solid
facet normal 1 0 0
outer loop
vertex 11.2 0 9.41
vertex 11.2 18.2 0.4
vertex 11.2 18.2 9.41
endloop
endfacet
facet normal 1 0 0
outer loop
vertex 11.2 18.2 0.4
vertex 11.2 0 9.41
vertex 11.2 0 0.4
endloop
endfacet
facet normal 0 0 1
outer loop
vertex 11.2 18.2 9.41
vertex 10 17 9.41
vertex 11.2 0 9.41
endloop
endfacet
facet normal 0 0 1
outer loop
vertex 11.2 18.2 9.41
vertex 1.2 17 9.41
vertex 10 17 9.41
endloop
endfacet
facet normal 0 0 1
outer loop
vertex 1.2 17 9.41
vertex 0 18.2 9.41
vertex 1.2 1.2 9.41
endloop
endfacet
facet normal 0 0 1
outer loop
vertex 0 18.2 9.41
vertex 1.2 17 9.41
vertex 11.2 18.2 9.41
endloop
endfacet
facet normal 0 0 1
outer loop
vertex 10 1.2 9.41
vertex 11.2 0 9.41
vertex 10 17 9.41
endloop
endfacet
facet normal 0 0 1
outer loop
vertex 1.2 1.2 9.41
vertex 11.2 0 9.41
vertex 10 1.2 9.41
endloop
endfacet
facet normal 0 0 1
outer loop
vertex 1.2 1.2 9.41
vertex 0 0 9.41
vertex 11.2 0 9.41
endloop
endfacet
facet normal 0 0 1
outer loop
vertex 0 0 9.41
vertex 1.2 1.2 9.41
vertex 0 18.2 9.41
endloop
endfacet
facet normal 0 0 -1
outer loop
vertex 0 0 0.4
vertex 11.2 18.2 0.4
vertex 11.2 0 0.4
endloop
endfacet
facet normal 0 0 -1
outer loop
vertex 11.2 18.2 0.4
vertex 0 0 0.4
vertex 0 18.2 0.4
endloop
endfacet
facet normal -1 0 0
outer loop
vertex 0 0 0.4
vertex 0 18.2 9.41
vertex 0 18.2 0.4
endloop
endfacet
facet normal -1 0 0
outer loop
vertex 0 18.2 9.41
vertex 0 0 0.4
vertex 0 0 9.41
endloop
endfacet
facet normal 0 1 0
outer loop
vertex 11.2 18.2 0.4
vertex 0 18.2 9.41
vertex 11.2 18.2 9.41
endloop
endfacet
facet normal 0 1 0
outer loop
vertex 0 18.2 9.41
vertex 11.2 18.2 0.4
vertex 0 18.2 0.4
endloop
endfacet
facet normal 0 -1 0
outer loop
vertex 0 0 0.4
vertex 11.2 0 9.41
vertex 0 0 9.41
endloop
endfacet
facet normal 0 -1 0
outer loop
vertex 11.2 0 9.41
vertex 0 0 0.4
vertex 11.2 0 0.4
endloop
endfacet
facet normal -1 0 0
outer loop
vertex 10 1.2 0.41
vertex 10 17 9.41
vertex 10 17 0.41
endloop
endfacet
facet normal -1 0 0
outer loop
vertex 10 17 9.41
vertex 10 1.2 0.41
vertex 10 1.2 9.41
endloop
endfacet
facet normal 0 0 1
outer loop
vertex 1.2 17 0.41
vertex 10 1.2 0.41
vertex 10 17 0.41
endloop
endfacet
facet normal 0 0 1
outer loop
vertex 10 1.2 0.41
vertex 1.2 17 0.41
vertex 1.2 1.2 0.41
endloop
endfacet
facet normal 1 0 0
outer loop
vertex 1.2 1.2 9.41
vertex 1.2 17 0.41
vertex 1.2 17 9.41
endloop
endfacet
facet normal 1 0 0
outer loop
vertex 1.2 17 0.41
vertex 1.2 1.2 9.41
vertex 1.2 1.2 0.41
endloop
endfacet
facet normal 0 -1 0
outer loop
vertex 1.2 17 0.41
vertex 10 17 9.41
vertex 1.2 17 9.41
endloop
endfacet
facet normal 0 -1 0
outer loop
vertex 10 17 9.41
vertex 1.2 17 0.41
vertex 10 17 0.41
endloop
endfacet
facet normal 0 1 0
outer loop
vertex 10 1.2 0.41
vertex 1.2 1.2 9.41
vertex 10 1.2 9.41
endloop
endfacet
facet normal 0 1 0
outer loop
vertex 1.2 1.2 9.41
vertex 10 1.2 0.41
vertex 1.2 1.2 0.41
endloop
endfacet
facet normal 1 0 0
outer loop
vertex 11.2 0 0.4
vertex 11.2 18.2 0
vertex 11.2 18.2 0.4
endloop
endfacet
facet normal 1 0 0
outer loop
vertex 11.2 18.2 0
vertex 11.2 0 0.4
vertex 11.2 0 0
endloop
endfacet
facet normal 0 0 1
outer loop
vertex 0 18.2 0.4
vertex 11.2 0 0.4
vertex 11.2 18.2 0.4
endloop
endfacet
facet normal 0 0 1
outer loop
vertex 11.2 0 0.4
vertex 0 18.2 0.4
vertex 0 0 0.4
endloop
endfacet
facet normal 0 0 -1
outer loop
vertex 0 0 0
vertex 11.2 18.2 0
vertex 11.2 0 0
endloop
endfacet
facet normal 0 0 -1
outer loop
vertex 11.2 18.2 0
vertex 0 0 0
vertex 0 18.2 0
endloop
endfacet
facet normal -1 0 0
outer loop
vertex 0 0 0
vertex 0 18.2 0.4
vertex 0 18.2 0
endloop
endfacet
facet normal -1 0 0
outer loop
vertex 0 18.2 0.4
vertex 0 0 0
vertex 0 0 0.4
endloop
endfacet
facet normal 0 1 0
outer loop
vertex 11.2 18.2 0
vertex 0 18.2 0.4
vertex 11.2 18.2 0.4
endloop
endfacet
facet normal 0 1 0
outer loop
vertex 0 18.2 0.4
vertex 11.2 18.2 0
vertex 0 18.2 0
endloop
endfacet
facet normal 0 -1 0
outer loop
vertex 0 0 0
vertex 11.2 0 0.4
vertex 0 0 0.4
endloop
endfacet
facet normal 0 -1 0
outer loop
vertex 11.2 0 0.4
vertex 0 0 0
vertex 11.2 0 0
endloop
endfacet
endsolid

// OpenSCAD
// file: ../../Base/Rotation.scad
// Fischertechnik Box Foundation
// Geometry Helpers Rotation

include <PlacementOptions.scad>

// getRotatedSpace(space, rotation=NoRotation)
// Rotates the space dependent on the specified rotation

function getRotatedSpace(space, rotation=NoRotation) = [
    (rotation == Rotate90 || rotation == Rotate270) ? space.y : space.x,
    (rotation == Rotate90 || rotation == Rotate270) ? space.x : space.y
];

// Rotates the given space around the fixed left lower corner
// space = the space the children needs as width/depth list [width,depth]
// rotation = 0 Rotate0 degrees, 1 Rotate90 degrees, 2 Rotate180 degrees, 3 Rotate270 degrees (equivalent to -90)

module RotateFix(space, rotation=NoRotation) {
    dy = (rotation == Rotate0 || rotation == Rotate270) ? 0 :
        (rotation == Rotate90) ? space.x :
        space.y;
    dx = (rotation < Rotate180) ? 0 :
        (rotation == Rotate180) ? space.x :
        space.y;
    
    translate([dx, dy, 0])
        rotate([0, 0, rotations[rotation]])
            children();
}
// file: ../../Base/Alignment.scad
// Fischertechnik Box Foundation
// Geometry Helpers Alignment

include <PlacementOptions.scad>

// getAlignedX(elementWidth, spaceWidth, align=AlignRight, offset=0)
// Gets the aligned X offset of an element with the given
// width in the given space.
// elementWidth = The width of the element to positon
// spaceWidth = The space where the element should be aligned
// align = 0 AlignLeft, 1 AlignCenter, 2 AlignRight
// offset = an optional offset from the aligned position. When
// aligned left or centered, then positive values are in X direction.
// When aligned right then positive values are in negative X direction.

function getAlignedX(elementWidth, spaceWidth, align=AlignRight, offset=0) =
    (align == AlignLeft) ?
        offset :
        ((align == AlignCenter) ?
        (spaceWidth - elementWidth)/2 + offset :
        spaceWidth - offset - elementWidth);

// getAlignedY(elementDepth, spaceDepth, align=AlignTop, offset=0)
// Gets the aligned Y offset of an element with the given
// depth in the given space.
// elementDepth = The depth of the element to positon
// spaceDepth = The space where the element should be aligned
// align = 0 AlignBottom, 1 AlignCenter, 2 AlignTop
// offset = an optional offset from the aligned position. When
// aligned bottom or centered, then positive values are in Y direction.
// When aligned top then positive values are in negative Y direction.

function getAlignedY(elementDepth, spaceDepth, align=AlignTop, offset=0) =
    (align == AlignBottom) ?
        offset :
        ((align == AlignCenter) ?
        (spaceDepth - elementDepth)/2 + offset :
        spaceDepth - offset - elementDepth);
// file: ../../Base/PlacementOptions.scad
// Fischertechnik Box Foundation
// Placement Options

// Alignment
NoAlign = 0;
AlignLeft = 1;
AlignBottom = 2;
AlignCenter = 3;
AlignRight = 4;
AlignTop = 5;

// Element rotation degree steps
rotations = [0, -90, -180, -270];

// Rotation
NoRotation = 0;
Rotate0 = 0;
Rotate90 = 1;
Rotate180 = 2;
Rotate270 = 3;

// Docking (seen from above)
NoDock = -1;
DockLeft = 0;
DockTop = 1;
DockRight = 2;
DockCorner = 2;
DockBottom = 3;

// Web corners
LowerLeft = 0;
UpperLeft = 1;
UpperRight = 2;
LowerRight = 3;

// Web position relative to corner
LeftOfCorner = 0;
RightOfCorner = 1;

// Rails direction
Horizontal = true;
Vertical = false;
// file: ../../Base/Boxes.scad
// Fischertechnik Box Foundation
// Pre-designed Boxes

use <Constants.scad>

include <PlacementOptions.scad>

box190Width = 190;
box190Depth = 130;
box130Width = 130;
box130Depth = 95;

// Values are from an original ec3 box
topBottomDifference = 1.5;
outerHeight = 40;
baseThickness = 1.8;
innerHeight = outerHeight - baseThickness;
stackExcess = 5.7;
radius = 3.5;
wallThickness = 1.5;
tolerance = 0.2;

boxWallThickness = wallThickness;
boxBaseThickness = baseThickness;
boxWebWidth = 3.0;

// getBoxWallThickness()
// Gets the wall thickness of a Fischertechnik Box
function getBoxWallThickness() = boxWallThickness;

// getBoxUsageHeight(height = 38.2)
// Gets the usable height of a Fischertechnik box
// height = Outer height of the box from the bottom to the upper edge.
function getBoxUsageHeight(height = outerHeight) = height - baseThickness - stackExcess;

// getBoxInnerHeight()
// Gets the inner height of a Fischertechnik box, including the stack excess
function getBoxInnerHeight() = innerHeight;

// getBoxBaseThickness()
// Gets the thickness of the Fischertechnik box base.
function getBoxBaseThickness() = boxBaseThickness;

// getBoxWebWidth()
// Gets the width of a box web
function getBoxWebWidth() = boxWebWidth;

// getBox190Space()
// Gets the usable inner space of a Box 190 as an x/y-list
function getBox190Space() = [
    box190Width - 2*getBoxWallThickness() - topBottomDifference, 
    box190Depth - 2*getBoxWallThickness() - topBottomDifference ];

// RoundedCornerPlate(width, depth, height, radius)
// Creates a body plate with rounded corners for a box. Used
// also to create the complete box with the hull module.
// width = Width of the plate
// depth = depth of the plate 
// height = thickness of the plate
// radius = radius of the rounded corner
module RoundedCornerPlate(width, depth, height, radius) {
    translate([radius, radius])
    hull() {
        w = width-2*radius;
        d = depth-2*radius;
        cube([w, d, height]);
        cylinder(height, r=radius, $fn=getFragments());
        translate([w, 0])
            cylinder(height, r=radius, $fn=getFragments());
        translate([w, d])
            cylinder(height, r=radius, $fn=getFragments());
        translate([0, d])
            cylinder(height, r=radius, $fn=getFragments());
    }
}

// BoxBase(width, depth)
// Creates an empty stackable Fischertechnik compatible box
// width = Outer width of the box (190, 130, ...)
// depth = Outer depth of the box (130, 95, ...)

module BoxBase(width, depth, height=outerHeight) {    
    thinPlate = 0.01;

    innerHeight = height - baseThickness;    
    
    module Body(tolerance=tolerance) {
        hull() {
            // Bottom with tolerance to fit into the original boxes when stacked
            translate([-wallThickness+tolerance, -wallThickness+tolerance, -baseThickness])
                RoundedCornerPlate(width-topBottomDifference-2*tolerance, depth-topBottomDifference-2*tolerance, thinPlate, radius);
            
            // Top
            translate([-wallThickness-topBottomDifference/2, -wallThickness-topBottomDifference/2, innerHeight-thinPlate])
                RoundedCornerPlate(width, depth, thinPlate, radius);
         }
    }

    module Cutoff() {
        hull() {
            coWidth = width - 2*wallThickness;
            coDepth = depth - 2*wallThickness;
            
            // Bottom
            RoundedCornerPlate(coWidth-topBottomDifference, coDepth-topBottomDifference, thinPlate, radius);

            // Top
            translate([-topBottomDifference/2, -topBottomDifference/2, innerHeight+thinPlate]) 
                RoundedCornerPlate(coWidth, coDepth, thinPlate, radius);
        }
    }
    
    difference() {        
        Body();
        Cutoff();
        stackOffset = innerHeight - stackExcess;
        translate([0, 0, stackOffset + baseThickness])
            Body(tolerance=0);
    }
}

// Creates the Fischertechnik empty box 130x190 mm and places it at position 0,0
// 190x130 are the outer sizes, the inner space is slightly smaller. Use getBox190Space() to get the inner sizes.
// The box is positioned that the usable inner space is at the 0,0,0 position.

module Box190() {
    BoxBase(box190Width, box190Depth);
}

// Gets the usable inner space of a Box 130 as an x/y-list
function getBox130Space() = [
    box130Width - 2*getBoxWallThickness() - topBottomDifference, 
    box130Depth - 2*getBoxWallThickness() - topBottomDifference ];

// Creates the Fischertechnik empty box 95x130 mm and places it at position 0,0
// 190x130 are the outer sizes, the inner space is slightly smaller. Use getBox190Space() to get the inner sizes.
// The box is positioned that the usable inner space is at the 0,0,0 position.

module Box130() {
    BoxBase(box130Width, box130Depth);
}

// Creates a web at the specified box walls
// corner 0 = LowerLeft, 1 = UpperLeft, 2 = UpperRight, 3 = LowerRight
// side 0 = LeftOfCorner, 1 = RightOfCorner
// distance = Distance in mm from the corner
// boxSpace = inner width and depth of the box (default: Box 190)
// webWidth = length of the web (default is 3 mms)
// webThickness = thickness of the web (default is 1 mm)
// height = Height of the web (standard is getBoxUsageHeight())
// sink = How much of the web is sunk into the wall

module BoxWeb(
    corner, 
    side, 
    distance, 
    boxSpace=getBox190Space(), 
    webWidth=getBoxWebWidth(), 
    webThickness=1.0, 
    height=getBoxUsageHeight(),
    sink = getBoxWallThickness()/2) {
    width = (corner % 2 == 0) ? 
            (side == LeftOfCorner ? webWidth : webThickness) :
            (side == LeftOfCorner ? webThickness : webWidth);

    depth = (corner % 2 == 0) ? 
            (side == RightOfCorner ? webWidth : webThickness) :
            (side == RightOfCorner ? webThickness : webWidth);
    
    xDiff = corner == LowerLeft ? 
                (side == LeftOfCorner ? -sink : distance) :
            (corner == UpperLeft ?                
                (side == LeftOfCorner ? distance : -sink) :
            (corner == UpperRight ?
                (side == LeftOfCorner ? boxSpace.x-webWidth+sink : boxSpace.x-distance-webThickness) :
                (side == LeftOfCorner ? boxSpace.x-distance-webThickness: boxSpace.x-webWidth+sink)));

    yDiff = corner == LowerLeft ? 
                (side == RightOfCorner ? -sink : distance) :
            (corner == UpperLeft ?
                (side == RightOfCorner ? boxSpace.y-distance-webThickness : boxSpace.y-webWidth+sink) :
            (corner == UpperRight ?
                (side == RightOfCorner ? boxSpace.y-webWidth+sink : boxSpace.y-distance-webThickness) :
                (side == RightOfCorner ? distance : -sink)));
    
    translate([xDiff, yDiff, -getExcess()])
        cube([width, depth, height + 2*getExcess()]);
}
// file: ../../Base/Placement.scad
// Fischertechnik Box Foundation
// Geometry Helpers Placement

use <Constants.scad>
use <Alignment.scad>
use <Rotation.scad>
use <Boxes.scad>

include <PlacementOptions.scad>

// Place(x=0, y=0, elementSpace=[0,0], alignX=AlignLeft, alignY=AlignBottom, rotation=Rotate0, boxSpace=getBox190Space())
// Places the child at the specified position
// y = Y-Position. This is a relative position when an X aligment is specified.
// x = X-Position. This is a relative position when an Y aligment is specified.
// elementSpace = space of the element to be placed [x,y]
// alignX = -1=NoAlign, 0 AlignLeft, 1 AlignCenter, 3 AlignRight (elementSpace and boxSpace required!)
// alignY = -1=NoAlign, 2 AlignBottom, 1 AlignCenter, 4 AlignTop (elementSpace and boxSpace required!)
// rotation = 0 Rotate0 0 degrees, 1 Rotate90 90 degrees, 
// 2 Rotate180 180 degrees, 3 Rotate270 270 degrees (equivalent to -90)
// boxSpace = Inner space of the box where the placement occurs [x,y] - default is Box 190x130 inner space

module Place(x=0, y=0, elementSpace=[0,0], 
  alignX=AlignLeft, alignY=AlignBottom, 
  rotation=NoRotation, boxSpace=getBox190Space()) {

    module Position(x, y, space, rotation=Rotate0) {
        translate([x, y, 0])
            RotateFix(space, rotation)
                children();
    }

    space = getRotatedSpace(elementSpace, rotation);
    alignedX = getAlignedX(space.x, boxSpace.x, alignX, x);
    alignedY = getAlignedY(space.y, boxSpace.y, alignY, y);
    Position(alignedX, alignedY, elementSpace, rotation)
        children();
}

// Center(space=getBox130Space(), elementSpace=[0,0])
// space = Space where the children is centered. For cylinder use centered=true and no elementSpace.
// elementSpace = space of the element to be centered [x,y]

module Center(space=getBox190Space(), elementSpace=[0,0]) {
    Place(elementSpace=elementSpace, boxSpace=space, alignX=AlignCenter, alignY=AlignCenter)
        children();
}

// CenterHorizontal(width=0, y=0, offset=0, space=getBox130Space())
// width = Width of the element to be placed.
// y = Y position of the element
// offset = Offset from the center position (negative will be left of the center)
// space = Space where the element is placed

module CenterHorizontal(width=0, y=0, offset=0, space=getBox190Space()) {
    Place(x=offset, y=y, elementSpace=[width, 0], boxSpace=space, alignX=AlignCenter)
        children(0);
}

// CenterVertical(depth=0, x=0, offset=0, space=getBox130Space())
// depth = Depth of the element to be placed.
// x = X position of the element
// offset = Offset from the center position (negative will be down of the center)
// space = Space where the element is placed

module CenterVertical(depth=0, x=0, offset=0, space=getBox190Space()) {
    Place(x=x, y=offset, elementSpace=[0, depth], boxSpace=space, alignY=AlignCenter)
        children(0);
}

// getIsVertical(align)
// True if the specified alignment needs a vertical orientation for a divider (AlignRight, AlignLeft)

function getIsVertical(align) = (align == AlignRight || align == AlignLeft);

// getIsHorizontal(align)
// True if the specified alignment needs a horizontal orientation for a divider (AlignTop, AlignBottom)

function getIsHorizontal(align) = (align == AlignTop || align == AlignBottom);
// file: ../../Elements/AxisClip10.scad
// Fischertechnik Box Library
// Axis for clip 10
// 31023

use <../ModelBase/Simple.scad>
use <../Base/Constants.scad>

/* [Element Parameters] */
height = 23;
clipHeight = 10;

/* [Hidden] */
width = 12;
depth = 12;
upperDiameter = 3.6;

// getAxisClip10Space()
// Gets the space of a n axis for a clip 10 with spring ring (mot2)

function getAxisClip10Space() = [width, depth, height];

// AxisClip10(height, clipHeight)
// Axis for clip 10 with spring ring (mot2)
// height = Height of the complete axis (standard is 23, in mot3 its only 12)
// clipHeight = Height of the part for the clip (standard is 10, in mot3 its only 7)

module AxisClip10(height=height, clipHeight=clipHeight) {
    LeveledAxisWithSpace(height, height-clipHeight, getAxisClip10Space(), diameter=upperDiameter);
}

// Test
color("lightgray")
AxisClip10(height, clipHeight);
// file: ../../Base/Constants.scad
// Fischertechnik Box Foundation
// Constants

// Constant values necessary for multiple elements

// Base constants
dividerThickness = 1.2;
excess = 0.01;
fragments = 90;
tolerance = 0.8;

// Gets the thickness of a divider 
function getDividerThickness() = dividerThickness;

// Gets the excess that is used to merge walls into each other
function getExcess() = excess;

// Gets amount of fragments of a cylinder
function getFragments() = fragments;

// Gets the inner tolerance of a frame to each side
function getTolerance() = tolerance;


// Fischertechnik specific constants
axisDiameter = 4;
axisBottomDiameter = axisDiameter + 1;
axisTolerance = 0.2;
axisLockingLength = 8;

// Gets axis diameter of Fischertechnik axis
function getAxisDiameter() = axisDiameter;

// Gets axis diameter tolerance (subtracted for element axis)
function getAxisTolerance() = axisTolerance;

// Gets the axis diameter for standing axis
function getStandAxisDiameter() = getAxisDiameter() - getAxisTolerance();

// Gets axis bottom diameter for thicker part at the bottom
function getAxisBottomDiameter() = axisBottomDiameter;

// Gets the lengthh of the locking part of a locking axis
function getAxisLockingLength() = axisLockingLength;

pinHeight = 2.5;
pinTolerance = 0.2;

// gets the height of a connecting pin
function getPinHeight() = pinHeight;

// gets the connecting pin height tolerance
function getPinTolerance() = pinTolerance;

standardEdgeDistance = 2.5;
standardWebDistance = 11.5;
standardCornerLength = 15;

// gets the standard distance to the wall of the box for dockable frames with webs
function getStandardEdgeDistance() = standardEdgeDistance;

// gets the standard distance of each web to the corner of the dockable frame
function getStandardWebDistance() = standardWebDistance;

// gets the standard length of the corner walls of a dockable frame
function getStandardCornerLength() = standardCornerLength;

tubeWallFactor = 0.8;

// gets the wall thickness of a tube.
function getTubeWallThickness() = tubeWallFactor * getDividerThickness();

smallPartsFrameHeight = 20;

// gets the frame height for docked small parts boxes.
function getSmallPartsFrameHeight() = smallPartsFrameHeight;

hubRingDiameter = 19.5;
hubRingLevelDiameter = 21;

// gets the diameter of a tube matching the inner ring of a wheel
function getHubRingDiameter() = hubRingDiameter;

// gets the diameter of a hub tube with a thicker diameter
function getHubRingLevelDiameter() = hubRingLevelDiameter;
// file: ../../Elements/FrameAngle15.scad
// Fischertechnik Box Library
// Frame for 15 degrees angle blocks
// 32071

use <../Base/Constants.scad>
use <../ModelBase/Simple.scad>

/* [Element Parameters] */
count = 1;

/* [Hidden] */
width = 8;
depth = 15;
height = 9;

// getFrameAngle15Space
// Gets the space the frame for 15 degrees angle blocks needs for count blocks
// count = Count of angle blocks

function getFrameAngle15Space(count=1) = getFrameOuterVolume([width * count, depth, height]);

// FrameAngle15(count)
// count = Count of angle blocks in x direction
// The walls of the frame are 9 mm high.

module FrameAngle15(count=1) {
    Frame([width * count, depth, height]);
}

// Tests
color ("lightgray")
FrameAngle15(count);
// file: ../TestPrint.scad
// 3D Print Test Base

use <../Base/Constants.scad>

use <../Elements/AxisClip10.scad>

module TestPrint(elementSpace) {
    cube([elementSpace.x, elementSpace.y, 0.4]);
    translate([0,0,0.4+getExcess()]) {
        children();
    }
}

TestPrint(getAxisClip10Space())
    AxisClip10();
// main file
// 3D Print Test
// FrameAngle15

use <../TestPrint.scad>
use <../../Elements/FrameAngle15.scad>

count=1;

TestPrint(getFrameAngle15Space(count))
    FrameAngle15(count);
